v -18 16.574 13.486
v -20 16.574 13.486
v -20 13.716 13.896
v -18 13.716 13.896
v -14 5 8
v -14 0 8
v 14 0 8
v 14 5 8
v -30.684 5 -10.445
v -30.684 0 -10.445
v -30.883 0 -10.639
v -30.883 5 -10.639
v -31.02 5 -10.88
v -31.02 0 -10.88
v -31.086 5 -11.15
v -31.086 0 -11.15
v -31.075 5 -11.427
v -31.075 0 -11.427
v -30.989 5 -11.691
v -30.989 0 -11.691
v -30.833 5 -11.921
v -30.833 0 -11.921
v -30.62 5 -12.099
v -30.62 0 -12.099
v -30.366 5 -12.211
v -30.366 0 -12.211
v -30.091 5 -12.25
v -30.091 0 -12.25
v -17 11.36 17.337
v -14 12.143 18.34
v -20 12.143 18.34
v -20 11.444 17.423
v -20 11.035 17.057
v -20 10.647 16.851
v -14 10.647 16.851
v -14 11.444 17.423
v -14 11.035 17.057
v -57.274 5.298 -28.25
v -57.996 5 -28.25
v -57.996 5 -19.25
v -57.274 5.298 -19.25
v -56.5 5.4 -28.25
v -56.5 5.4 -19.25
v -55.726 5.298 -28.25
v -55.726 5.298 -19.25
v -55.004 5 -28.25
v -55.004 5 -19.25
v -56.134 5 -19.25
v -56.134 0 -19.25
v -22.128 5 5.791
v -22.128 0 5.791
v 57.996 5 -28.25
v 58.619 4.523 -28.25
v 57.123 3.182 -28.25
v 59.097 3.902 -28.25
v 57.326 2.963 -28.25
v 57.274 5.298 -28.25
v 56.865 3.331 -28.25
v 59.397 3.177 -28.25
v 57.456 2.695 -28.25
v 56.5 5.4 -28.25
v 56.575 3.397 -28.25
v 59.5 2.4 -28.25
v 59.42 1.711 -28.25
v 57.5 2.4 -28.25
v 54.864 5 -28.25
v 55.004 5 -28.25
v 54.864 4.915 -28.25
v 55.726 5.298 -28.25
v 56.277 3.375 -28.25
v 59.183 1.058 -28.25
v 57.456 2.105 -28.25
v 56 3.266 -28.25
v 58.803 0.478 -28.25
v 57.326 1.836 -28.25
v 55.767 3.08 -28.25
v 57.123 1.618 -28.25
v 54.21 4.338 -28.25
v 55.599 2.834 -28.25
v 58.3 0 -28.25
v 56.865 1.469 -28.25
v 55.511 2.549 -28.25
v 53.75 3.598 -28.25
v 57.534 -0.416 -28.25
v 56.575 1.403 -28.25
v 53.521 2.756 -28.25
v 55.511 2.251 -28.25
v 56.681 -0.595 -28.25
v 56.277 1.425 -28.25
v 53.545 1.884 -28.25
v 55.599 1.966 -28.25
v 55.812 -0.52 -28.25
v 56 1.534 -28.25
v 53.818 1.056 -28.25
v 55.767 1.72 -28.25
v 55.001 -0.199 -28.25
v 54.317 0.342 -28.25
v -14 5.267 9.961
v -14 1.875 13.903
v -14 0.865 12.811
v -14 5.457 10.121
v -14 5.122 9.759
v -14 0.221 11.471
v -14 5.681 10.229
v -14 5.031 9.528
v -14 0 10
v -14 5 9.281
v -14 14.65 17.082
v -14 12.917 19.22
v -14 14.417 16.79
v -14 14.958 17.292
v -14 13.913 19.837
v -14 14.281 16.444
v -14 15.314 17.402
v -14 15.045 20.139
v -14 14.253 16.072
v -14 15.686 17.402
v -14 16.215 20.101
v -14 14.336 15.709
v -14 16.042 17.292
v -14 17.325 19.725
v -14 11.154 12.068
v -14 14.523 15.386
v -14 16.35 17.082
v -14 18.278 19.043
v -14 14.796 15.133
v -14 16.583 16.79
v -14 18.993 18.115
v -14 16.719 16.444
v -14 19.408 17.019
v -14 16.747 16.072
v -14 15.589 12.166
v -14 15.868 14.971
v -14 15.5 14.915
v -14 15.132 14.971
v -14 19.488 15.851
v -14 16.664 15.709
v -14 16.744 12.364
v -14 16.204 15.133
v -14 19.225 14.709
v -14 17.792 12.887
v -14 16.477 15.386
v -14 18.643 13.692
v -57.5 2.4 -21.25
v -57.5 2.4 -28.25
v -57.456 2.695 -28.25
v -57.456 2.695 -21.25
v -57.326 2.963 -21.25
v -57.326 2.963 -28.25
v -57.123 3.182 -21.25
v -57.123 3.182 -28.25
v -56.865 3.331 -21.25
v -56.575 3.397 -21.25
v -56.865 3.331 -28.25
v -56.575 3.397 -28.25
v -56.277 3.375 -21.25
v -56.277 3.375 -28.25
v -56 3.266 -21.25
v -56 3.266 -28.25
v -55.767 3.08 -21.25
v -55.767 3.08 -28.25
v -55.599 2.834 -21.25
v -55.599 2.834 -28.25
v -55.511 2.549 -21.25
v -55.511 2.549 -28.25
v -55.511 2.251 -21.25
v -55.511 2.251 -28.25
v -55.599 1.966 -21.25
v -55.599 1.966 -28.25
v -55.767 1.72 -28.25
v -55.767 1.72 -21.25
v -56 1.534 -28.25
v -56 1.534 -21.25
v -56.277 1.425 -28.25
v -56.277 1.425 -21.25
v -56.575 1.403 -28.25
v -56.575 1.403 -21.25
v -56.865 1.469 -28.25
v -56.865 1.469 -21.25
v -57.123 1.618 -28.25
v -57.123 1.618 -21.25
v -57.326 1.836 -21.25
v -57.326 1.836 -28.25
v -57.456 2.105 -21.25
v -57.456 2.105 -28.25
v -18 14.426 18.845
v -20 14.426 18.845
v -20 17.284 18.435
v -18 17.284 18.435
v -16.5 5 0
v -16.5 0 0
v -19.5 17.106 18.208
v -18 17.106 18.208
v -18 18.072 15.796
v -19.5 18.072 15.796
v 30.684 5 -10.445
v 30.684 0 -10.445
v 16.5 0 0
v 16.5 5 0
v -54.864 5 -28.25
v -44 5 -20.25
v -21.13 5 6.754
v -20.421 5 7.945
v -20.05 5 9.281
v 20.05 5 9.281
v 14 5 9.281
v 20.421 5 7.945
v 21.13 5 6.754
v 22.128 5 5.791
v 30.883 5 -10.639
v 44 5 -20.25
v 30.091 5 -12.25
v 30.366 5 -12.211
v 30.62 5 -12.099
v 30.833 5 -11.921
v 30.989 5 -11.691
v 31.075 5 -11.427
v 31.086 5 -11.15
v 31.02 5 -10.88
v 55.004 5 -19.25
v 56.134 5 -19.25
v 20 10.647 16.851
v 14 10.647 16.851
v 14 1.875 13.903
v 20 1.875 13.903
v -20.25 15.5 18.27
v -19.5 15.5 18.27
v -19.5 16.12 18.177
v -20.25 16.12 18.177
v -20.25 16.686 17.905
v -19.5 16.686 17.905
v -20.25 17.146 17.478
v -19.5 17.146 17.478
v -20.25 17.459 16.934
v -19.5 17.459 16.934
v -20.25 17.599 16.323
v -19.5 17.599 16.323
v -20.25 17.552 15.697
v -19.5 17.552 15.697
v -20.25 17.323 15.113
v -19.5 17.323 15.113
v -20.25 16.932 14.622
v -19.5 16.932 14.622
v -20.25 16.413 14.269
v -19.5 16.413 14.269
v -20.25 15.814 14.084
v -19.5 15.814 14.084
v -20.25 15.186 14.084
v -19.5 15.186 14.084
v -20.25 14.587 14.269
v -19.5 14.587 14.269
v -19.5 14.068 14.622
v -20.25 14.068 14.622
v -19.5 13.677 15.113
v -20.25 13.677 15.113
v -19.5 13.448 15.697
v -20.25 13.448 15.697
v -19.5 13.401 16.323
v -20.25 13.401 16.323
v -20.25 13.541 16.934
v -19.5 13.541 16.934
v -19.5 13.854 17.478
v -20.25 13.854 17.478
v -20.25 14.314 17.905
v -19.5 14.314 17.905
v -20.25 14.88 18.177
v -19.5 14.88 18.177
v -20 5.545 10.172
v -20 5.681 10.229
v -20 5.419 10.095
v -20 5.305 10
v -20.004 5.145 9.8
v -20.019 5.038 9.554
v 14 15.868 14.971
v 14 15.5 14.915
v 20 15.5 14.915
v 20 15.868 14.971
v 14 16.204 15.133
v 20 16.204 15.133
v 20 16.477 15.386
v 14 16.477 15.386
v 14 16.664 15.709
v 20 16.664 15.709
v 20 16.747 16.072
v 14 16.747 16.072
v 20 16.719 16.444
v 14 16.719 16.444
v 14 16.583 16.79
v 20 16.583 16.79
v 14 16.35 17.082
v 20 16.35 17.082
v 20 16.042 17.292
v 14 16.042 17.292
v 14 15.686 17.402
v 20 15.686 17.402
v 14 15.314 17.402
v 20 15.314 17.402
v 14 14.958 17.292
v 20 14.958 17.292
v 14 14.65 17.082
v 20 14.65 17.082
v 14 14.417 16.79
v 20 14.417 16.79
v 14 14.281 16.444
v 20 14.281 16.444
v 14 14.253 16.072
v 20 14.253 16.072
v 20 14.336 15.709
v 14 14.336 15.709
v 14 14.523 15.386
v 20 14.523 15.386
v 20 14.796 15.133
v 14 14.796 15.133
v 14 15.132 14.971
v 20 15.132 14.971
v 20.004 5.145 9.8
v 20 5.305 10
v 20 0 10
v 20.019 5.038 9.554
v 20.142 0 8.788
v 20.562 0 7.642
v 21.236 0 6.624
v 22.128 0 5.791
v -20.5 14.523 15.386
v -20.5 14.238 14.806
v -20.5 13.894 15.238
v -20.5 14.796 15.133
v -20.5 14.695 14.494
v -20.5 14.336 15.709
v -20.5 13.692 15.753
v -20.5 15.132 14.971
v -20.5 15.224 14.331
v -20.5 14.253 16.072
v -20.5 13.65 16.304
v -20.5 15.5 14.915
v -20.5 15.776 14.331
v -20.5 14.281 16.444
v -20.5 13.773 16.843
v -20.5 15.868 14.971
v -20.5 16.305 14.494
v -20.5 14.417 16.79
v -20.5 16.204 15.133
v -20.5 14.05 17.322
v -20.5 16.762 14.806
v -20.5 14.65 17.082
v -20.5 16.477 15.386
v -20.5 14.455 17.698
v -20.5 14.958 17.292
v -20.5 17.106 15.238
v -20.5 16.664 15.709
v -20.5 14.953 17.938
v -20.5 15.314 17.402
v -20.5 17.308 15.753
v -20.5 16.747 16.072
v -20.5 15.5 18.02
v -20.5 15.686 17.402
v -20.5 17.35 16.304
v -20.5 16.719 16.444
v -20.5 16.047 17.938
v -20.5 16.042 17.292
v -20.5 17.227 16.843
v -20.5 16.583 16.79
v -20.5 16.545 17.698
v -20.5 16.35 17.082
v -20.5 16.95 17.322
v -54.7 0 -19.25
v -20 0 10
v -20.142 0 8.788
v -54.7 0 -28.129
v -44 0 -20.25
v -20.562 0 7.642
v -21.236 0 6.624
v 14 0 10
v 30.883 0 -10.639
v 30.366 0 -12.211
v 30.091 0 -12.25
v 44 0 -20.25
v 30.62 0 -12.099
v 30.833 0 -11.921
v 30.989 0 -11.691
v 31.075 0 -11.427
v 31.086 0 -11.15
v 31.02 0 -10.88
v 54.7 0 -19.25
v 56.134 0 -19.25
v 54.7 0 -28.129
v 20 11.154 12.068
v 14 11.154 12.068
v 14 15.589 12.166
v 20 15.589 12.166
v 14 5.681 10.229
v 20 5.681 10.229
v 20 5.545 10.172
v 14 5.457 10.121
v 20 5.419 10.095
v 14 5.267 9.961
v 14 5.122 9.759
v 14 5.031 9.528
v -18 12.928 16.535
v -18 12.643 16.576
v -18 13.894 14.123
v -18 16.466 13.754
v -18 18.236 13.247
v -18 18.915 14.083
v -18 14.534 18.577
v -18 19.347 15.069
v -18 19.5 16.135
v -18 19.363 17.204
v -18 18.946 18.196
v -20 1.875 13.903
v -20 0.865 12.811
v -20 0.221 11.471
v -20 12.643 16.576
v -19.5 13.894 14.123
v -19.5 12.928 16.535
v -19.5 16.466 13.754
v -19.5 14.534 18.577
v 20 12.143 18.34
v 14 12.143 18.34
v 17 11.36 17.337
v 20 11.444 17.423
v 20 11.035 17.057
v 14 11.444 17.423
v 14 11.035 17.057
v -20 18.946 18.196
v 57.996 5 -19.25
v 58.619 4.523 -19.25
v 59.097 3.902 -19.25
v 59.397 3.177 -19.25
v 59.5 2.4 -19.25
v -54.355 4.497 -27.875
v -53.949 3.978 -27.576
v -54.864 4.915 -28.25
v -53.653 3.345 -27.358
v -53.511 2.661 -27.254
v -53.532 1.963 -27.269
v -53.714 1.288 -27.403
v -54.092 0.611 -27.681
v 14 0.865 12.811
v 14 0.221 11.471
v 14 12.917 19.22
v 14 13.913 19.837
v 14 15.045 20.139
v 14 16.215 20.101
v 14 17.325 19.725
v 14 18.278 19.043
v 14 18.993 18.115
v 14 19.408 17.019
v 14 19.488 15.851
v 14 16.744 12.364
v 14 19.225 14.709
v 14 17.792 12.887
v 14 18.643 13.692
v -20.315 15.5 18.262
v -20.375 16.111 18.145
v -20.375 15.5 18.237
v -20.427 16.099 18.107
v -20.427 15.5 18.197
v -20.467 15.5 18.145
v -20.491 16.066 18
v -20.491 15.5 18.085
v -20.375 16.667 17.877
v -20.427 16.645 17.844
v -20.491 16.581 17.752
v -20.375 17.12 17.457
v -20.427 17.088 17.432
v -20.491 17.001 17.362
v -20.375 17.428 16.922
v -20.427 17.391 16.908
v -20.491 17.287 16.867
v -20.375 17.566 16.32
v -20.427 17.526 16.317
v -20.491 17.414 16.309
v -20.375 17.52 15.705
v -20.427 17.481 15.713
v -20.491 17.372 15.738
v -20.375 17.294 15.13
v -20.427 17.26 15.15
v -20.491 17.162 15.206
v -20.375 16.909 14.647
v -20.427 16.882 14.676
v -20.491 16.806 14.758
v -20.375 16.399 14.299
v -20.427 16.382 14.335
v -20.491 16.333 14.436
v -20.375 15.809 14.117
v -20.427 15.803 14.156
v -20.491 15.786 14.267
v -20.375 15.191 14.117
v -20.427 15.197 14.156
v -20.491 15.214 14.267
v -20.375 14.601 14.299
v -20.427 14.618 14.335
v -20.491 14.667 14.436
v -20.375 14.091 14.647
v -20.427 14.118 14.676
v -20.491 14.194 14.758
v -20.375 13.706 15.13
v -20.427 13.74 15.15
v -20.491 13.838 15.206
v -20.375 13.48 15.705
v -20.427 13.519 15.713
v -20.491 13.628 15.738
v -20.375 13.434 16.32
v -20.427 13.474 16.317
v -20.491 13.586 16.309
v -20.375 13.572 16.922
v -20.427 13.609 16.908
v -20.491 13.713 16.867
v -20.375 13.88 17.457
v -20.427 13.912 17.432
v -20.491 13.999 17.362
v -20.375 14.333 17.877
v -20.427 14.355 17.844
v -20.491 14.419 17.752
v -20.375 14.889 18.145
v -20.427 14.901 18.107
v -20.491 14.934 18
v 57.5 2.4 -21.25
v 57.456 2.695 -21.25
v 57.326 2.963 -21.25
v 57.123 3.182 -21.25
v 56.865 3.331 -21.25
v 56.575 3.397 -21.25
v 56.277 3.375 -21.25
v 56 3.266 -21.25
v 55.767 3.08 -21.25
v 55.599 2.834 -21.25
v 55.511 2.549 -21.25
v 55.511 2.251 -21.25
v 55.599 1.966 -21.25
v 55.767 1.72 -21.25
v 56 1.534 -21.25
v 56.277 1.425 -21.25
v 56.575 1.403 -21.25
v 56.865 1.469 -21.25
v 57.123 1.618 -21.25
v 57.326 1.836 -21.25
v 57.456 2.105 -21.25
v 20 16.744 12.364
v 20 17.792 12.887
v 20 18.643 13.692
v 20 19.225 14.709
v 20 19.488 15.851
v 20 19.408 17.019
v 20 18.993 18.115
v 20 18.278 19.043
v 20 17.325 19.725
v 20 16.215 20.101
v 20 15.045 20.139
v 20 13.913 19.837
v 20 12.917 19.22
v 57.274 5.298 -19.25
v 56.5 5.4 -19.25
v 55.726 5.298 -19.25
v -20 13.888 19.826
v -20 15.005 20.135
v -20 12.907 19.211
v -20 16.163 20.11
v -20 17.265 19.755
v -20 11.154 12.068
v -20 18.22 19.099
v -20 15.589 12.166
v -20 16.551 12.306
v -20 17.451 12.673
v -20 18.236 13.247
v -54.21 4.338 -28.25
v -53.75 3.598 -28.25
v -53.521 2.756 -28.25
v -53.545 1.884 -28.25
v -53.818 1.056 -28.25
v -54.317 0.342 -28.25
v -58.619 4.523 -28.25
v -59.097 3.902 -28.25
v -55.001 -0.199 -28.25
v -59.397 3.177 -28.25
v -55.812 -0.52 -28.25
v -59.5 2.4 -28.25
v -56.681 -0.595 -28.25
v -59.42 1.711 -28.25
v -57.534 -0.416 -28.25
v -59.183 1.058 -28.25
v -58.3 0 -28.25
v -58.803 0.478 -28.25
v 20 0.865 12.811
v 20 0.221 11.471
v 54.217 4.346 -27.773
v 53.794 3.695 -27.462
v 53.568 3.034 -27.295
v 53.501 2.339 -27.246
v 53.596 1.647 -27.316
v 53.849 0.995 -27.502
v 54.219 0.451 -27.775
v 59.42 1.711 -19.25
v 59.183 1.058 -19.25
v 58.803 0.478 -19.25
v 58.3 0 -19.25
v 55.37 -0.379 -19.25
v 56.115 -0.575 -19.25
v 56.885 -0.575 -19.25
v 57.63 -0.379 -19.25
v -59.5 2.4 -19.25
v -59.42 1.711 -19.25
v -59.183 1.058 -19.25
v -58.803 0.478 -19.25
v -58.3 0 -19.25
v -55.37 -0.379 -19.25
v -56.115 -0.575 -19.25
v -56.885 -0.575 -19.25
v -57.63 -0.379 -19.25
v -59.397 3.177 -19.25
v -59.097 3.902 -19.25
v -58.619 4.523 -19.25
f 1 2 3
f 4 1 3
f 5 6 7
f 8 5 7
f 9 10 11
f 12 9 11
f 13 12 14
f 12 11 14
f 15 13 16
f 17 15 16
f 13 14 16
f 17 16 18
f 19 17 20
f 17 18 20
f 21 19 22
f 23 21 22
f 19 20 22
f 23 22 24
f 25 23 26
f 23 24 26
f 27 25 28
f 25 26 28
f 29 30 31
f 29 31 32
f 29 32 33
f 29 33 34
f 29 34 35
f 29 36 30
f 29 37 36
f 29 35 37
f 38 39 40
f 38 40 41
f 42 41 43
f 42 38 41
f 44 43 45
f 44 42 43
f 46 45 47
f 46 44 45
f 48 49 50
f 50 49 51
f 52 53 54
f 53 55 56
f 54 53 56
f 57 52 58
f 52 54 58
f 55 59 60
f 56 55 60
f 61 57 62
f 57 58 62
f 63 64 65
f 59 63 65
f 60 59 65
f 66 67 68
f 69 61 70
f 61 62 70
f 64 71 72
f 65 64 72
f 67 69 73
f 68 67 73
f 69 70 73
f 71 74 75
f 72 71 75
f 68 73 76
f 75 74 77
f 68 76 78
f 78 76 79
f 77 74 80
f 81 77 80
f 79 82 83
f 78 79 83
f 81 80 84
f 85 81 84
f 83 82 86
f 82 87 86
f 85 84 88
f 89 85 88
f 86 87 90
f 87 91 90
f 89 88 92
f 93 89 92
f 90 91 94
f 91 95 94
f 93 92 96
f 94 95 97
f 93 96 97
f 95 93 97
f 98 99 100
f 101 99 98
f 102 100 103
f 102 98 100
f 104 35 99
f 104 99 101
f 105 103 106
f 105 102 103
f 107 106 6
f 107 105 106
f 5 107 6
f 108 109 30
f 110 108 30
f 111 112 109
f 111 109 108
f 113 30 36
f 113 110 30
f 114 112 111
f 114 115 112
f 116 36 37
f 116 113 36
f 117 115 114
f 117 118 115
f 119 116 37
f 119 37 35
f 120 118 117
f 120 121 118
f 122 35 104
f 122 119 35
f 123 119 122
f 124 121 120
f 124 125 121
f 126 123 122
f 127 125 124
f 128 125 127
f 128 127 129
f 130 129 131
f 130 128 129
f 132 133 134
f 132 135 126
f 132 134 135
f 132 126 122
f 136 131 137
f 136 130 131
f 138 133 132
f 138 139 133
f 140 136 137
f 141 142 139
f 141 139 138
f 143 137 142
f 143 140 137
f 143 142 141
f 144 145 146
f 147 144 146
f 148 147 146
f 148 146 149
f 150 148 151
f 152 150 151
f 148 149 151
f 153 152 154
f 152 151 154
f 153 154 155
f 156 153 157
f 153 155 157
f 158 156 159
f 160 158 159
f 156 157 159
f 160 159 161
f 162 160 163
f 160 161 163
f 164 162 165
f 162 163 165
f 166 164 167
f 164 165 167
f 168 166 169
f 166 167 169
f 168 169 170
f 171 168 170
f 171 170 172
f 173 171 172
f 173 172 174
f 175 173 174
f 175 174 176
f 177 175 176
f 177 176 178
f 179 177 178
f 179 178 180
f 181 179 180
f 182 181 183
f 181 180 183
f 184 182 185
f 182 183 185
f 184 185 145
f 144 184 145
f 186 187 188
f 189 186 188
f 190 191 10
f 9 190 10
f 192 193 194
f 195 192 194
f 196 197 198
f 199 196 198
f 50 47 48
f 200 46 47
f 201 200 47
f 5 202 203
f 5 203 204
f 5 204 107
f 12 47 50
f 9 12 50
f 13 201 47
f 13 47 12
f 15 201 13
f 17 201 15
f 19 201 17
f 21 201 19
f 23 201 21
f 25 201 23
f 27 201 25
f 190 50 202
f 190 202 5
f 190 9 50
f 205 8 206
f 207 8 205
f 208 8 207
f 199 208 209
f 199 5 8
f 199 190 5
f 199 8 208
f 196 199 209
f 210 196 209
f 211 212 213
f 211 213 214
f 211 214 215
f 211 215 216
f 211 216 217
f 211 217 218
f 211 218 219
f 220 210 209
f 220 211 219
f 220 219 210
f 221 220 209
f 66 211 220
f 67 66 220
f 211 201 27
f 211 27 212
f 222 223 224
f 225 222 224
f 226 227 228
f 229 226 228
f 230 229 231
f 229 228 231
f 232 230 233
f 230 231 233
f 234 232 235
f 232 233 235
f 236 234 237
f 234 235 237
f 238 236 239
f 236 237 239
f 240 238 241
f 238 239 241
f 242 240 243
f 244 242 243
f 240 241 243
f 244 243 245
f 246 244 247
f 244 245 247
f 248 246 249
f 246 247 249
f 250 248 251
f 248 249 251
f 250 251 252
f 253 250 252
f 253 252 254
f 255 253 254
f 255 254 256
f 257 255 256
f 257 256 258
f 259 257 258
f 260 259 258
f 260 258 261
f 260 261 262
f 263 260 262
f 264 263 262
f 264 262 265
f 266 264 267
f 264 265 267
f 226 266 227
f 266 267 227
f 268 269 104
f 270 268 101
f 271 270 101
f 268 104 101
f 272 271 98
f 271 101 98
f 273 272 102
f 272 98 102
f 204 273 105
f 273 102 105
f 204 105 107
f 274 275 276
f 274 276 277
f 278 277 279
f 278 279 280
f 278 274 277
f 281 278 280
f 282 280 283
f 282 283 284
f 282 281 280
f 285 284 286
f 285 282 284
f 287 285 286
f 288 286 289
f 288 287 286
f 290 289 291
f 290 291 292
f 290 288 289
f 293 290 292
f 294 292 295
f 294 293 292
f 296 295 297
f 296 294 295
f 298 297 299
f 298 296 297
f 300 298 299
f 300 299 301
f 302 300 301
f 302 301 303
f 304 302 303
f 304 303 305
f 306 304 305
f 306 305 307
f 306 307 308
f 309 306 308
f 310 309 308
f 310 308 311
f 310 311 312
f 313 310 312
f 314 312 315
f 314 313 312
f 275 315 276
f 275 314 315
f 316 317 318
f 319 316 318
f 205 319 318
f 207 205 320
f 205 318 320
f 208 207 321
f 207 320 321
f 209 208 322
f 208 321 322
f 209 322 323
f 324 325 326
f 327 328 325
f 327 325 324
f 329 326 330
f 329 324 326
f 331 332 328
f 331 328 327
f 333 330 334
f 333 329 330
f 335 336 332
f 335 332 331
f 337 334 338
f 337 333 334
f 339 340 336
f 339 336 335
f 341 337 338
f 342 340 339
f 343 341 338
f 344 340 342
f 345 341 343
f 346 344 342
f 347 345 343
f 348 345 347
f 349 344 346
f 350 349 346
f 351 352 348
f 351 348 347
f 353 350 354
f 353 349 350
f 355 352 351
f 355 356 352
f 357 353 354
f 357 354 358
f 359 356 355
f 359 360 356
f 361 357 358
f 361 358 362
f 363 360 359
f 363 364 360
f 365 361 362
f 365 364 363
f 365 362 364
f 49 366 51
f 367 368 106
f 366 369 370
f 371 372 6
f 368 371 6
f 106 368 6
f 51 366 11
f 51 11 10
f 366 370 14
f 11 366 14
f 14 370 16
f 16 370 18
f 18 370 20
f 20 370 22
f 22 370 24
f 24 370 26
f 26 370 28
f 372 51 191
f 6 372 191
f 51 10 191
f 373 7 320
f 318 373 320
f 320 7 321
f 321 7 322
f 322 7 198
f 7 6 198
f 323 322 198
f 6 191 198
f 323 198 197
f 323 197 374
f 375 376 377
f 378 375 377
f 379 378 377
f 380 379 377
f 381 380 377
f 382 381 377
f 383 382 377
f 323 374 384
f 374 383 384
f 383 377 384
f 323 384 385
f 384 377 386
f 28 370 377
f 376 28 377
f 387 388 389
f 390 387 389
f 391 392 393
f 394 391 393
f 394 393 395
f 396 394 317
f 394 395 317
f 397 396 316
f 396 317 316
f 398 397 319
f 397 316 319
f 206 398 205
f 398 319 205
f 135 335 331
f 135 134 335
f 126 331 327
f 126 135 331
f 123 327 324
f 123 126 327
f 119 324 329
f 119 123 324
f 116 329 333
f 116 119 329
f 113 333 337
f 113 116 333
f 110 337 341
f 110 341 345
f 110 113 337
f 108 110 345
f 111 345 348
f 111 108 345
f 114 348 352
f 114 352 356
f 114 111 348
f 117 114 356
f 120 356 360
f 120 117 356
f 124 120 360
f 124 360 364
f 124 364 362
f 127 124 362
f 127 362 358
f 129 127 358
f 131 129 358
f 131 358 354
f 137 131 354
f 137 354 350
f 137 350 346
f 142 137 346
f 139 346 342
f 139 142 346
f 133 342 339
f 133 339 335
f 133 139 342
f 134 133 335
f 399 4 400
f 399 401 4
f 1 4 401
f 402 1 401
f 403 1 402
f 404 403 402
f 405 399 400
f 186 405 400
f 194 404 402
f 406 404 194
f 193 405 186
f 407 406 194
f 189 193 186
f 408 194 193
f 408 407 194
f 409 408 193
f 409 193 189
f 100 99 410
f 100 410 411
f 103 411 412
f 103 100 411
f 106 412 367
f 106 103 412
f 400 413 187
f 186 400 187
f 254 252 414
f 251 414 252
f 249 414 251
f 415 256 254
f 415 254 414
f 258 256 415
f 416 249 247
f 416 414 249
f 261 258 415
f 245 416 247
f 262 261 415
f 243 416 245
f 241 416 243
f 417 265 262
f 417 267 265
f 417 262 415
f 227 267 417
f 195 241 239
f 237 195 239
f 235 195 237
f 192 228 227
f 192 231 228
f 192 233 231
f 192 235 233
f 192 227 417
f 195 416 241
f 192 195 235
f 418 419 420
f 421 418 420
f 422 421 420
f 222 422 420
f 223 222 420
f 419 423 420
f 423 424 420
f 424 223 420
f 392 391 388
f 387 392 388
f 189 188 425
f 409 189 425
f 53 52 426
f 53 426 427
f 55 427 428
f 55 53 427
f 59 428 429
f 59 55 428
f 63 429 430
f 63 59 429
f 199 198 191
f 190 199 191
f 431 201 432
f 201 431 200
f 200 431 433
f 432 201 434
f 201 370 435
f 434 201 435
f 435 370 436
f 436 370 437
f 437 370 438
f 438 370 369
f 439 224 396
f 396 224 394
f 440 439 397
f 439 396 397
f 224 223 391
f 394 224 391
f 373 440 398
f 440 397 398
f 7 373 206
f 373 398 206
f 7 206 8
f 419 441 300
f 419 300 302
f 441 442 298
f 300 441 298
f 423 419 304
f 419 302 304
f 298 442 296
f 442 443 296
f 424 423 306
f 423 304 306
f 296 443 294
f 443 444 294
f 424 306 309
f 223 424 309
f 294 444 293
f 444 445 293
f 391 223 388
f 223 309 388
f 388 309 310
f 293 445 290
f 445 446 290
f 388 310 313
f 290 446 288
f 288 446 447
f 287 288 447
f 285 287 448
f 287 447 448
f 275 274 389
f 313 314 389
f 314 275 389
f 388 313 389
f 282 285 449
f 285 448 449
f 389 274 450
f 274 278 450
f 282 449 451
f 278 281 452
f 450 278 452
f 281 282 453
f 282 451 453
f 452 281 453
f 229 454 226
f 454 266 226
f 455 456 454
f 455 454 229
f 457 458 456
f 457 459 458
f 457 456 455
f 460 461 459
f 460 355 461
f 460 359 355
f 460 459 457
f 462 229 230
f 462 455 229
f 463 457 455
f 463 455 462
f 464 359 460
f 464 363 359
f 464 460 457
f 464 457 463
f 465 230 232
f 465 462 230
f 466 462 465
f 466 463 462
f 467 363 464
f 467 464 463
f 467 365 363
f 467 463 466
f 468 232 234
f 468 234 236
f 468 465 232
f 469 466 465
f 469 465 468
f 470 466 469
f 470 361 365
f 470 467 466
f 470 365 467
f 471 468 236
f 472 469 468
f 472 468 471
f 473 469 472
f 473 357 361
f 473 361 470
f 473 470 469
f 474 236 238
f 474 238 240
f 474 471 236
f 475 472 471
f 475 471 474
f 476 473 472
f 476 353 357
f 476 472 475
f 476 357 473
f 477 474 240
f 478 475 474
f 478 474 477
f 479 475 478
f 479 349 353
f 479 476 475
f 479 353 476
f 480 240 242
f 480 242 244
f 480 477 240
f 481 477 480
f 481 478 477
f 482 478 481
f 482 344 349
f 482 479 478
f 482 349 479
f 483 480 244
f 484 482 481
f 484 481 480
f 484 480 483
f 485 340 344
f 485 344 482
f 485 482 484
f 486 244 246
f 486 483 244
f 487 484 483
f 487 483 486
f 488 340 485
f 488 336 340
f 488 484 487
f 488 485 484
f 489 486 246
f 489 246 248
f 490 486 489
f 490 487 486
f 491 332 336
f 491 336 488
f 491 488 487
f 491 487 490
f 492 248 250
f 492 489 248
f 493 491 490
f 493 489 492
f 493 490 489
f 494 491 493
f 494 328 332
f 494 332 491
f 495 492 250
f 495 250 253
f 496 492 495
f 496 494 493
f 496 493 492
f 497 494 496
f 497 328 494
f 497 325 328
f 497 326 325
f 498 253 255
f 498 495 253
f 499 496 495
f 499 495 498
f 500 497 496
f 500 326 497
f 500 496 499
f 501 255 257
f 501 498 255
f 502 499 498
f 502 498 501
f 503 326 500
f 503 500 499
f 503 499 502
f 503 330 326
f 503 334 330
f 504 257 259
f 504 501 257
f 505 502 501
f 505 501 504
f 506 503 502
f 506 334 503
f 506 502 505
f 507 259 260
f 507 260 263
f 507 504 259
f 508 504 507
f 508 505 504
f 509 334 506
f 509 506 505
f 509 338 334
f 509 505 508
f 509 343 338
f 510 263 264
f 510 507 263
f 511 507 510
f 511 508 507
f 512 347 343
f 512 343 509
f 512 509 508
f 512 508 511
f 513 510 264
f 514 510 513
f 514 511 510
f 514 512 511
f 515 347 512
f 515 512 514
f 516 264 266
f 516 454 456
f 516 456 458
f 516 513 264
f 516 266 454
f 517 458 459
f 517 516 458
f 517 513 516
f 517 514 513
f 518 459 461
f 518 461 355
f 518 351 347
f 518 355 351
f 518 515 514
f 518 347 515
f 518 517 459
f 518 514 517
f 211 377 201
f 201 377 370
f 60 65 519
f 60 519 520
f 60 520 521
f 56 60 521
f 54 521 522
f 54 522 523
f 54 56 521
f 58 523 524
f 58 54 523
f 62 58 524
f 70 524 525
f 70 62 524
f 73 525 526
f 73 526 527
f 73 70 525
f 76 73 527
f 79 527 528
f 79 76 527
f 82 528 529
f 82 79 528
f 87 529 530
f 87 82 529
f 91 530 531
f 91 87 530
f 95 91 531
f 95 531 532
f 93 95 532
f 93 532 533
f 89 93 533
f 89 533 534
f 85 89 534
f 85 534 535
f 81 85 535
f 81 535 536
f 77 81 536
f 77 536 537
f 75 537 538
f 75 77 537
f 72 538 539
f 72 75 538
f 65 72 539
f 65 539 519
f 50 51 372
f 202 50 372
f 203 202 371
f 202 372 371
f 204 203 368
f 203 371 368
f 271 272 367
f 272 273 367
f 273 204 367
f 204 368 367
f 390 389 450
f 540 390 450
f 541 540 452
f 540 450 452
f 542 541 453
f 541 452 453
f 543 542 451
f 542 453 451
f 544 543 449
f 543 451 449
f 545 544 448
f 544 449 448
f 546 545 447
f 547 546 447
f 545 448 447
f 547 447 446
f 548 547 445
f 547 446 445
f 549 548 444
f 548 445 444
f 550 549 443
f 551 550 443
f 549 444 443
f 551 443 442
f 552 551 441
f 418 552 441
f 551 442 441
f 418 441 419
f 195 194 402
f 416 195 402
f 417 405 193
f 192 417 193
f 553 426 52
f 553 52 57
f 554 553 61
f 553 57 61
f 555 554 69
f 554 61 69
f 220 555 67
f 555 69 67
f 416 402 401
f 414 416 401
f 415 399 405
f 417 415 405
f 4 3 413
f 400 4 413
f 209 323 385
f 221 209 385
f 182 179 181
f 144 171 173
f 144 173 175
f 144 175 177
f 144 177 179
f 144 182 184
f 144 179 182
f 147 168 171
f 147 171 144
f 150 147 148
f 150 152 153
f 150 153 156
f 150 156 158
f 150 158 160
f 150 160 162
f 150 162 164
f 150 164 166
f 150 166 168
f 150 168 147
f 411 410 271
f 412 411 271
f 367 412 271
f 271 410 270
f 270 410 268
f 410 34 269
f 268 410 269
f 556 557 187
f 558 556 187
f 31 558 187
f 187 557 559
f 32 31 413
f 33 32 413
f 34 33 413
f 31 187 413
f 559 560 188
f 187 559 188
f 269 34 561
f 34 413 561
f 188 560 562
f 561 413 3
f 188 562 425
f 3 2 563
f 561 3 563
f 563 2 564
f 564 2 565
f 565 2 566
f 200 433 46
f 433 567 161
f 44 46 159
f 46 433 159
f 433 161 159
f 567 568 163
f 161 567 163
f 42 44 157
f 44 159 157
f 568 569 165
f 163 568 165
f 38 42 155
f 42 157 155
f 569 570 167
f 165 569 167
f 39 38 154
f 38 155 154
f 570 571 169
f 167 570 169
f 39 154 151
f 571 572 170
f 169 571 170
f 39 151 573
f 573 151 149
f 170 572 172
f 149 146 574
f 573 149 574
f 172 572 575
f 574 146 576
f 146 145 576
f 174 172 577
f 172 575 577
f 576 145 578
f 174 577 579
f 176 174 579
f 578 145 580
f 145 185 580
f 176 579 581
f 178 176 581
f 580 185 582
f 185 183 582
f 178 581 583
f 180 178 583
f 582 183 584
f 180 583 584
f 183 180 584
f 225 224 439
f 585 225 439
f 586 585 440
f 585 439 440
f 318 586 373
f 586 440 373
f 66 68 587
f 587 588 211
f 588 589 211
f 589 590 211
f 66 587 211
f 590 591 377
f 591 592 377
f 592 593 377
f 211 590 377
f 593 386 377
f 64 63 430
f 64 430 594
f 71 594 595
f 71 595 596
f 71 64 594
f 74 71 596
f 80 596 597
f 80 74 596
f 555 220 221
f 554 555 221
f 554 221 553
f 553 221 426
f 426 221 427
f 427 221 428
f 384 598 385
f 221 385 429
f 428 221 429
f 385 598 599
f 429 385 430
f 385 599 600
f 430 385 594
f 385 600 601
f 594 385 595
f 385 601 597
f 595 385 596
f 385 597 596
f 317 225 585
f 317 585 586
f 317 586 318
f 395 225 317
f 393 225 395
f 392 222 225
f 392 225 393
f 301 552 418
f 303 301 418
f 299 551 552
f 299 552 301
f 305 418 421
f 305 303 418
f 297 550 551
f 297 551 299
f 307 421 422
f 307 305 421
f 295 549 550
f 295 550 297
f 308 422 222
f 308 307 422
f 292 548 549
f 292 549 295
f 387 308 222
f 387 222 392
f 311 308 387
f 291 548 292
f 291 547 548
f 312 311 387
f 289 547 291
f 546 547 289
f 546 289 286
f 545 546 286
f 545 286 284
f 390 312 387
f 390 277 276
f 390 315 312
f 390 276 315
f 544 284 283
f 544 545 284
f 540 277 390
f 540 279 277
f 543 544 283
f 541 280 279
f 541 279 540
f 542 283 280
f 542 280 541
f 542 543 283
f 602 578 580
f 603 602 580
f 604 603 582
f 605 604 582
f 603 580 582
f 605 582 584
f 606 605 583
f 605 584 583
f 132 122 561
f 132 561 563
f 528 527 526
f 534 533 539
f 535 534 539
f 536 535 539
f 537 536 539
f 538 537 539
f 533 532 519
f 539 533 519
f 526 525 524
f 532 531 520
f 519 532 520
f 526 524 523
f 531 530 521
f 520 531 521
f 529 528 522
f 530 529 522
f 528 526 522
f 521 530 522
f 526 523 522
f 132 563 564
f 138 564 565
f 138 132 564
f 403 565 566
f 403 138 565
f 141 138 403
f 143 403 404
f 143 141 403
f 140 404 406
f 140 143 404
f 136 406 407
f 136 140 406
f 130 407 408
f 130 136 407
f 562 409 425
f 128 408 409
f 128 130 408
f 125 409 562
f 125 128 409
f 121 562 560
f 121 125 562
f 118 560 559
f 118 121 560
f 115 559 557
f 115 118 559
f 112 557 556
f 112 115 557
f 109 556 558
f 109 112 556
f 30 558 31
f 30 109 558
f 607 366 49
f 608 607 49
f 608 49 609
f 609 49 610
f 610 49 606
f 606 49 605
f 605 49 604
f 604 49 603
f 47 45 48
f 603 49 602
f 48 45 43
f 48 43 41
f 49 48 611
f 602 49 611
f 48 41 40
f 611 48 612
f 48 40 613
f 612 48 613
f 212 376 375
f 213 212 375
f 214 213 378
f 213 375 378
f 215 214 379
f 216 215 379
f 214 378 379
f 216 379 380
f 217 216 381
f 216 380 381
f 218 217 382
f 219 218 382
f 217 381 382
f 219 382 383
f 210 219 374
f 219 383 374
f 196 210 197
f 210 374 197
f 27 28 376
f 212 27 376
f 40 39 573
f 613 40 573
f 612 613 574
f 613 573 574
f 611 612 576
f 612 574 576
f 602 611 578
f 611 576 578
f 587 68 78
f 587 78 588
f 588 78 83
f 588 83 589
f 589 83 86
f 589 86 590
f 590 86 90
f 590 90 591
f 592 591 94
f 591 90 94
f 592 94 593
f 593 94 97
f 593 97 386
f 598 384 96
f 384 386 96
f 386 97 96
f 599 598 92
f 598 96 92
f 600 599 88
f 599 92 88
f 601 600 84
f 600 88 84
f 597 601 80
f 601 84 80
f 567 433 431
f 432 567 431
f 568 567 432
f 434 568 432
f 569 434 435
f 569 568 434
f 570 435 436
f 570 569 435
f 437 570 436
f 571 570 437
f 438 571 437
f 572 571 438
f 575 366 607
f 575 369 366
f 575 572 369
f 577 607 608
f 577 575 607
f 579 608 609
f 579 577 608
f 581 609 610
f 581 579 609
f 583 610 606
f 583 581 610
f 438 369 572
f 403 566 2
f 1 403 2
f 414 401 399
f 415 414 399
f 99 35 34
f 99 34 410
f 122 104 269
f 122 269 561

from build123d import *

# Parameters (mm, degrees)
BOSS_EXTRUDE1_DEPTH  = 5
SKETCH2_R            = 3
BOSS_EXTRUDE2_DEPTH  = 9
CUT_EXTRUDE2_DEPTH   = 9
SKETCH5_R            = 1
CUT_EXTRUDE3_DEPTH   = 7
SKETCH6_R            = 4
SKETCH6_R_2          = 1.25
BOSS_EXTRUDE3_DEPTH  = 6
FILLET1_R            = 1
FILLET1_OF_MIRROR3_R = 1
SKETCH7_R            = 1.25
CUT_EXTRUDE4_DEPTH   = 2
SKETCH8_R            = 1.25
BOSS_EXTRUDE4_DEPTH  = 1.5
SKETCH9_R            = 2.104951794
SKETCH9_R_2          = 1.25
BOSS_EXTRUDE5_DEPTH  = 1
FILLET2_R            = 0.25


with BuildPart() as part:
    # Sketch1 → Boss-Extrude1 (new body)
    with BuildSketch(Plane(origin=(0, 0, 0), x_dir=(1, 0, 0), z_dir=(0, 1, 0))):
        with BuildLine():
            Line((44, 20.25), (-44, 20.25))
            Line((-44, 20.25), (-54.864197531, 28.25))
            Line((-54.864197531, 28.25), (-59.5, 28.25))
            Line((-59.5, 28.25), (-59.5, 19.25))
            Line((-59.5, 19.25), (-56.133853902, 19.25))
            Line((-56.133853902, 19.25), (-22.127720492, -5.790880057))
            ThreePointArc((-22.127720492, -5.790880057), (-20.56215902, -7.641828824), (-20, -10))
            Line((-20, -10), (-14, -10))
            Line((-14, -10), (-14, -8))
            Line((-14, -8), (14, -8))
            Line((14, -8), (14, -10))
            Line((14, -10), (20, -10))
            ThreePointArc((20, -10), (20.56215902, -7.641828824), (22.127720492, -5.790880057))
            Line((22.127720492, -5.790880057), (56.133853902, 19.25))
            Line((56.133853902, 19.25), (59.5, 19.25))
            Line((59.5, 19.25), (59.5, 28.25))
            Line((59.5, 28.25), (54.864197531, 28.25))
            Line((54.864197531, 28.25), (44, 20.25))
        make_face()
        with BuildLine():
            Line((16.5, 0), (-16.5, 0))
            Line((-16.5, 0), (-30.684242256, 10.444760207))
            ThreePointArc((-30.684242256, 10.444760207), (-31.041356055, 11.562057853), (-30.091292954, 12.25))
            Line((-30.091292954, 12.25), (30.091292954, 12.25))
            ThreePointArc((30.091292954, 12.25), (31.041356055, 11.562057853), (30.684242256, 10.444760207))
            Line((30.684242256, 10.444760207), (16.5, 0))
        make_face(mode=Mode.SUBTRACT)
    extrude(amount=BOSS_EXTRUDE1_DEPTH)

    # Sketch2 → Boss-Extrude2 (add)
    with BuildSketch(Plane(origin=(0, 0, -28.25), x_dir=(-1, 0, 0), z_dir=(0, 0, -1))):
        with Locations((56.5, 2.399773273)):
            Circle(SKETCH2_R)
    boss_extrude2 = extrude(amount=-BOSS_EXTRUDE2_DEPTH)

    # Sketch3 → Cut-Extrude2 (cut)
    with BuildSketch(Plane(origin=(0, 0, -28.25), x_dir=(-1, 0, 0), z_dir=(0, 0, -1))):
        with BuildLine():
            Line((60.611507076, 5.399773273), (56.5, 5.399773273))
            ThreePointArc((56.5, 5.399773273), (57.274377111, 5.298107293), (57.996269016, 5))
            Line((57.996269016, 5), (59.5, 5))
            Line((59.5, 5), (59.5, 2.399773273))
            Line((59.5, 2.399773273), (59.5, 0))
            Line((59.5, 0), (58.300302263, 0))
            ThreePointArc((58.300302263, 0), (57.448862524, -0.446216873), (56.5, -0.600226727))
            Line((56.5, -0.600226727), (60.611507076, -0.600226727))
            Line((60.611507076, -0.600226727), (60.611507076, 5.399773273))
        make_face()
        with BuildLine():
            Line((59.5, 5), (57.996269016, 5))
            ThreePointArc((57.996269016, 5), (59.096998946, 3.901637606), (59.5, 2.399773273))
            Line((59.5, 2.399773273), (59.5, 5))
        make_face()
        with BuildLine():
            Line((59.5, 0), (59.5, 2.399773273))
            ThreePointArc((59.5, 2.399773273), (59.183366057, 1.058301467), (58.300302263, 0))
            Line((58.300302263, 0), (59.5, 0))
        make_face()
    cut_extrude2 = extrude(amount=-CUT_EXTRUDE2_DEPTH, mode=Mode.SUBTRACT)

    # Sketch5 → Cut-Extrude3 (cut)
    with BuildSketch(Plane(origin=(0, 0, -28.25), x_dir=(-1, 0, 0), z_dir=(0, 0, -1))):
        with Locations((56.5, 2.399773273)):
            Circle(SKETCH5_R)
    cut_extrude3 = extrude(amount=-CUT_EXTRUDE3_DEPTH, mode=Mode.SUBTRACT)

    # Mirror1: Boss-Extrude2, Cut-Extrude2, Cut-Extrude3 across plane
    add(boss_extrude2.mirror(Plane(origin=(0, 0, 0), x_dir=(0, 0, 1), z_dir=(1, 0, 0))))
    add(cut_extrude2.mirror(Plane(origin=(0, 0, 0), x_dir=(0, 0, 1), z_dir=(1, 0, 0))), mode=Mode.SUBTRACT)
    add(cut_extrude3.mirror(Plane(origin=(0, 0, 0), x_dir=(0, 0, 1), z_dir=(1, 0, 0))), mode=Mode.SUBTRACT)

    # Sketch6 → Boss-Extrude3 (add)
    # profile 1 of 4: a face of its own
    with BuildSketch(Plane(origin=(-14, 0, 0), x_dir=(0, 0, -1), z_dir=(1, 0, 0))):
        with BuildLine():
            Line((-10, 0), (-10, 5))
            Line((-10, 5), (-12.067952412, 11.15441805))
            Line((-12.067952412, 11.15441805), (-12.801123052, 13.336401829))
            ThreePointArc((-12.801123052, 13.336401829), (-14.714307507, 11.772518008), (-17.18129323, 11.631136219))
            Line((-17.18129323, 11.631136219), (-16.850726128, 10.647337883))
            Line((-16.850726128, 10.647337883), (-13.903123749, 1.875))
            ThreePointArc((-13.903123749, 1.875), (-12.165063509, 0.493060906), (-10, 0))
        make_face()
    # profile 2 of 4: a face of its own
    with BuildSketch(Plane(origin=(-14, 0, 0), x_dir=(0, 0, -1), z_dir=(1, 0, 0))):
        with BuildLine():
            Line((-16.850726128, 10.647337883), (-17.18129323, 11.631136219))
            ThreePointArc((-17.18129323, 11.631136219), (-17.781137494, 11.840816405), (-18.340208526, 12.142840417))
            add(Edge.make_bspline(
                [(-18.340208526, 12.142840417), (-17.078630295, 11.325601808), (-16.850726128, 10.647337883)],
                knots=[0, 0, 0, 1, 1, 1], degree=2))
        make_face()
    # profile 3 of 4: a face of its own
    with BuildSketch(Plane(origin=(-14, 0, 0), x_dir=(0, 0, -1), z_dir=(1, 0, 0))):
        with Locations((-16.165471867, 15.5)):
            Circle(SKETCH6_R)
        with Locations((-16.165471867, 15.5)):
            Circle(SKETCH6_R_2, mode=Mode.SUBTRACT)
    # profile 4 of 4: a face of its own
    with BuildSketch(Plane(origin=(-14, 0, 0), x_dir=(0, 0, -1), z_dir=(1, 0, 0))):
        with BuildLine():
            Line((-12.801123052, 13.336401829), (-12.067952412, 11.15441805))
            Line((-12.067952412, 11.15441805), (-12.166458423, 15.588833991))
            ThreePointArc((-12.166458423, 15.588833991), (-12.165718514, 15.544419734), (-12.165471867, 15.5))
            ThreePointArc((-12.165471867, 15.5), (-12.327673327, 14.372479548), (-12.801123052, 13.336401829))
        make_face()
    boss_extrude3 = extrude(amount=-BOSS_EXTRUDE3_DEPTH)

    # Fillet1
    fillet1_edges = [part.edges().sort_by_distance(p)[0] for p in [
        (-17, 5, 10),
    ]]
    fillet(fillet1_edges, radius=FILLET1_R)

    # Mirror3: Boss-Extrude3 across plane
    add(boss_extrude3.mirror(Plane(origin=(0, 0, 0), x_dir=(0, 0, 1), z_dir=(1, 0, 0))))

    # Fillet1 of Mirror3
    fillet1_of_mirror3_edges = [part.edges().sort_by_distance(p)[0] for p in [
        (17, 5, 10),
    ]]
    fillet(fillet1_of_mirror3_edges, radius=FILLET1_OF_MIRROR3_R)

    # Sketch7 → Cut-Extrude4 (cut)
    # profile 1 of 2: a face of its own
    with BuildSketch(Plane.ZY.offset(20)):
        with BuildLine():
            Line((13.247212207, 18.235646277), (13.48576811, 16.573555357))
            Line((13.48576811, 16.573555357), (15.7553462, 18.357469207))
            Line((15.7553462, 18.357469207), (18.435049958, 17.28391385))
            Line((18.435049958, 17.28391385), (18.196494055, 18.94600477))
            ThreePointArc((18.196494055, 18.94600477), (15.597185073, 19.459425478), (13.247212207, 18.235646277))
        make_face()
    # profile 2 of 2: a face of its own
    with BuildSketch(Plane.ZY.offset(20)):
        Polygon((13.895893777, 13.71608615), (16.575597534, 12.642530793), (18.845175625, 14.426444643), (18.435049958, 17.28391385), (15.7553462, 18.357469207), (13.48576811, 16.573555357), align=None)
        with Locations(Location((16.165471867, 15.5, 0), (0, 0, 180))):
            Circle(SKETCH7_R, mode=Mode.SUBTRACT)
    extrude(amount=-CUT_EXTRUDE4_DEPTH, mode=Mode.SUBTRACT)

    # Sketch8 → Boss-Extrude4 (add)
    with BuildSketch(Plane.ZY.offset(18)):
        Polygon((15.796358767, 18.071722287), (13.753738485, 16.466199822), (14.122851586, 13.894477535), (16.534584967, 12.928277713), (18.577205249, 14.533800178), (18.208092149, 17.105522465), align=None)
        with Locations(Location((16.165471867, 15.5, 0), (0, 0, 180))):
            Circle(SKETCH8_R, mode=Mode.SUBTRACT)
    extrude(amount=BOSS_EXTRUDE4_DEPTH)

    # Sketch9 → Boss-Extrude5 (add)
    with BuildSketch(Plane.ZY.offset(19.5)):
        with Locations((16.165471867, 15.5)):
            Circle(SKETCH9_R)
        with Locations(Location((16.165471867, 15.5, 0), (0, 0, 180))):
            Circle(SKETCH9_R_2, mode=Mode.SUBTRACT)
    extrude(amount=BOSS_EXTRUDE5_DEPTH)

    # Fillet2
    fillet2_edges = [part.edges().sort_by_distance(p)[0] for p in [
        (-20.5, 15.5, 14.060520073),
    ]]
    fillet(fillet2_edges, radius=FILLET2_R)


solid = part.part
